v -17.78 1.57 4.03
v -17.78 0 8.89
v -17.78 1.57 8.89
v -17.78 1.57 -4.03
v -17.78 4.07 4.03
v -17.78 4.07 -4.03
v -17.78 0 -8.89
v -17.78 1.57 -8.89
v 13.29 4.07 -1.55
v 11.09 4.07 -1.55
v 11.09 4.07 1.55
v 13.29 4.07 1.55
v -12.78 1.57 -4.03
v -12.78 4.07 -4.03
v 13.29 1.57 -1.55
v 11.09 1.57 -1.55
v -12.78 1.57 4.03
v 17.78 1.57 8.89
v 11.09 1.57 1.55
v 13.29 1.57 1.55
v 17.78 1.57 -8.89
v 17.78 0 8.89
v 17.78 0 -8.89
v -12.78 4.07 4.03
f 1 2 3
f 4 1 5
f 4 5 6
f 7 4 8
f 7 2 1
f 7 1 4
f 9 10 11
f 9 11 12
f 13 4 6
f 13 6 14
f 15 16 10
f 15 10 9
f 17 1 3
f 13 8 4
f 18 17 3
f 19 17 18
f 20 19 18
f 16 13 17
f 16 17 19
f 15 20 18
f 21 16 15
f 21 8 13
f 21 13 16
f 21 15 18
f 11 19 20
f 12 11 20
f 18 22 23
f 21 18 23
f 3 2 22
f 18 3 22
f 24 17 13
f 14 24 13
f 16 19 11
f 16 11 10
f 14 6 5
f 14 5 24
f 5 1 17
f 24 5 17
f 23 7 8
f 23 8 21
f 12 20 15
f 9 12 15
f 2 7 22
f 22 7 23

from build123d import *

# Parameters (mm, degrees)
SKETCH1_W      = 35.56
SKETCH1_H      = 17.78
BOARD_DEPTH    = 1.57
SKETCH2_W      = 5
SKETCH2_H      = 8.06
MICROUSB_DEPTH = 2.5
SKETCH3_W      = 2.2
SKETCH3_H      = 3.1
BUTTON_DEPTH   = 2.5


with BuildPart() as part:
    # Sketch1 → Board (new body)
    with BuildSketch(Plane(origin=(0, 0, 0), x_dir=(1, 0, 0), z_dir=(0, 1, 0))):
        Rectangle(SKETCH1_W, SKETCH1_H)
    extrude(amount=BOARD_DEPTH)

    # Sketch2 → MicroUSB (add)
    with BuildSketch(Plane(origin=(0, 1.57, 0), x_dir=(1, 0, 0), z_dir=(0, 1, 0))):
        with Locations((-15.28, 0)):
            Rectangle(SKETCH2_W, SKETCH2_H)
    extrude(amount=MICROUSB_DEPTH)

    # Sketch3 → Button (add)
    with BuildSketch(Plane(origin=(0, 1.57, 0), x_dir=(1, 0, 0), z_dir=(0, 1, 0))):
        with Locations((12.19, 0)):
            Rectangle(SKETCH3_W, SKETCH3_H)
    extrude(amount=BUTTON_DEPTH)


solid = part.part
